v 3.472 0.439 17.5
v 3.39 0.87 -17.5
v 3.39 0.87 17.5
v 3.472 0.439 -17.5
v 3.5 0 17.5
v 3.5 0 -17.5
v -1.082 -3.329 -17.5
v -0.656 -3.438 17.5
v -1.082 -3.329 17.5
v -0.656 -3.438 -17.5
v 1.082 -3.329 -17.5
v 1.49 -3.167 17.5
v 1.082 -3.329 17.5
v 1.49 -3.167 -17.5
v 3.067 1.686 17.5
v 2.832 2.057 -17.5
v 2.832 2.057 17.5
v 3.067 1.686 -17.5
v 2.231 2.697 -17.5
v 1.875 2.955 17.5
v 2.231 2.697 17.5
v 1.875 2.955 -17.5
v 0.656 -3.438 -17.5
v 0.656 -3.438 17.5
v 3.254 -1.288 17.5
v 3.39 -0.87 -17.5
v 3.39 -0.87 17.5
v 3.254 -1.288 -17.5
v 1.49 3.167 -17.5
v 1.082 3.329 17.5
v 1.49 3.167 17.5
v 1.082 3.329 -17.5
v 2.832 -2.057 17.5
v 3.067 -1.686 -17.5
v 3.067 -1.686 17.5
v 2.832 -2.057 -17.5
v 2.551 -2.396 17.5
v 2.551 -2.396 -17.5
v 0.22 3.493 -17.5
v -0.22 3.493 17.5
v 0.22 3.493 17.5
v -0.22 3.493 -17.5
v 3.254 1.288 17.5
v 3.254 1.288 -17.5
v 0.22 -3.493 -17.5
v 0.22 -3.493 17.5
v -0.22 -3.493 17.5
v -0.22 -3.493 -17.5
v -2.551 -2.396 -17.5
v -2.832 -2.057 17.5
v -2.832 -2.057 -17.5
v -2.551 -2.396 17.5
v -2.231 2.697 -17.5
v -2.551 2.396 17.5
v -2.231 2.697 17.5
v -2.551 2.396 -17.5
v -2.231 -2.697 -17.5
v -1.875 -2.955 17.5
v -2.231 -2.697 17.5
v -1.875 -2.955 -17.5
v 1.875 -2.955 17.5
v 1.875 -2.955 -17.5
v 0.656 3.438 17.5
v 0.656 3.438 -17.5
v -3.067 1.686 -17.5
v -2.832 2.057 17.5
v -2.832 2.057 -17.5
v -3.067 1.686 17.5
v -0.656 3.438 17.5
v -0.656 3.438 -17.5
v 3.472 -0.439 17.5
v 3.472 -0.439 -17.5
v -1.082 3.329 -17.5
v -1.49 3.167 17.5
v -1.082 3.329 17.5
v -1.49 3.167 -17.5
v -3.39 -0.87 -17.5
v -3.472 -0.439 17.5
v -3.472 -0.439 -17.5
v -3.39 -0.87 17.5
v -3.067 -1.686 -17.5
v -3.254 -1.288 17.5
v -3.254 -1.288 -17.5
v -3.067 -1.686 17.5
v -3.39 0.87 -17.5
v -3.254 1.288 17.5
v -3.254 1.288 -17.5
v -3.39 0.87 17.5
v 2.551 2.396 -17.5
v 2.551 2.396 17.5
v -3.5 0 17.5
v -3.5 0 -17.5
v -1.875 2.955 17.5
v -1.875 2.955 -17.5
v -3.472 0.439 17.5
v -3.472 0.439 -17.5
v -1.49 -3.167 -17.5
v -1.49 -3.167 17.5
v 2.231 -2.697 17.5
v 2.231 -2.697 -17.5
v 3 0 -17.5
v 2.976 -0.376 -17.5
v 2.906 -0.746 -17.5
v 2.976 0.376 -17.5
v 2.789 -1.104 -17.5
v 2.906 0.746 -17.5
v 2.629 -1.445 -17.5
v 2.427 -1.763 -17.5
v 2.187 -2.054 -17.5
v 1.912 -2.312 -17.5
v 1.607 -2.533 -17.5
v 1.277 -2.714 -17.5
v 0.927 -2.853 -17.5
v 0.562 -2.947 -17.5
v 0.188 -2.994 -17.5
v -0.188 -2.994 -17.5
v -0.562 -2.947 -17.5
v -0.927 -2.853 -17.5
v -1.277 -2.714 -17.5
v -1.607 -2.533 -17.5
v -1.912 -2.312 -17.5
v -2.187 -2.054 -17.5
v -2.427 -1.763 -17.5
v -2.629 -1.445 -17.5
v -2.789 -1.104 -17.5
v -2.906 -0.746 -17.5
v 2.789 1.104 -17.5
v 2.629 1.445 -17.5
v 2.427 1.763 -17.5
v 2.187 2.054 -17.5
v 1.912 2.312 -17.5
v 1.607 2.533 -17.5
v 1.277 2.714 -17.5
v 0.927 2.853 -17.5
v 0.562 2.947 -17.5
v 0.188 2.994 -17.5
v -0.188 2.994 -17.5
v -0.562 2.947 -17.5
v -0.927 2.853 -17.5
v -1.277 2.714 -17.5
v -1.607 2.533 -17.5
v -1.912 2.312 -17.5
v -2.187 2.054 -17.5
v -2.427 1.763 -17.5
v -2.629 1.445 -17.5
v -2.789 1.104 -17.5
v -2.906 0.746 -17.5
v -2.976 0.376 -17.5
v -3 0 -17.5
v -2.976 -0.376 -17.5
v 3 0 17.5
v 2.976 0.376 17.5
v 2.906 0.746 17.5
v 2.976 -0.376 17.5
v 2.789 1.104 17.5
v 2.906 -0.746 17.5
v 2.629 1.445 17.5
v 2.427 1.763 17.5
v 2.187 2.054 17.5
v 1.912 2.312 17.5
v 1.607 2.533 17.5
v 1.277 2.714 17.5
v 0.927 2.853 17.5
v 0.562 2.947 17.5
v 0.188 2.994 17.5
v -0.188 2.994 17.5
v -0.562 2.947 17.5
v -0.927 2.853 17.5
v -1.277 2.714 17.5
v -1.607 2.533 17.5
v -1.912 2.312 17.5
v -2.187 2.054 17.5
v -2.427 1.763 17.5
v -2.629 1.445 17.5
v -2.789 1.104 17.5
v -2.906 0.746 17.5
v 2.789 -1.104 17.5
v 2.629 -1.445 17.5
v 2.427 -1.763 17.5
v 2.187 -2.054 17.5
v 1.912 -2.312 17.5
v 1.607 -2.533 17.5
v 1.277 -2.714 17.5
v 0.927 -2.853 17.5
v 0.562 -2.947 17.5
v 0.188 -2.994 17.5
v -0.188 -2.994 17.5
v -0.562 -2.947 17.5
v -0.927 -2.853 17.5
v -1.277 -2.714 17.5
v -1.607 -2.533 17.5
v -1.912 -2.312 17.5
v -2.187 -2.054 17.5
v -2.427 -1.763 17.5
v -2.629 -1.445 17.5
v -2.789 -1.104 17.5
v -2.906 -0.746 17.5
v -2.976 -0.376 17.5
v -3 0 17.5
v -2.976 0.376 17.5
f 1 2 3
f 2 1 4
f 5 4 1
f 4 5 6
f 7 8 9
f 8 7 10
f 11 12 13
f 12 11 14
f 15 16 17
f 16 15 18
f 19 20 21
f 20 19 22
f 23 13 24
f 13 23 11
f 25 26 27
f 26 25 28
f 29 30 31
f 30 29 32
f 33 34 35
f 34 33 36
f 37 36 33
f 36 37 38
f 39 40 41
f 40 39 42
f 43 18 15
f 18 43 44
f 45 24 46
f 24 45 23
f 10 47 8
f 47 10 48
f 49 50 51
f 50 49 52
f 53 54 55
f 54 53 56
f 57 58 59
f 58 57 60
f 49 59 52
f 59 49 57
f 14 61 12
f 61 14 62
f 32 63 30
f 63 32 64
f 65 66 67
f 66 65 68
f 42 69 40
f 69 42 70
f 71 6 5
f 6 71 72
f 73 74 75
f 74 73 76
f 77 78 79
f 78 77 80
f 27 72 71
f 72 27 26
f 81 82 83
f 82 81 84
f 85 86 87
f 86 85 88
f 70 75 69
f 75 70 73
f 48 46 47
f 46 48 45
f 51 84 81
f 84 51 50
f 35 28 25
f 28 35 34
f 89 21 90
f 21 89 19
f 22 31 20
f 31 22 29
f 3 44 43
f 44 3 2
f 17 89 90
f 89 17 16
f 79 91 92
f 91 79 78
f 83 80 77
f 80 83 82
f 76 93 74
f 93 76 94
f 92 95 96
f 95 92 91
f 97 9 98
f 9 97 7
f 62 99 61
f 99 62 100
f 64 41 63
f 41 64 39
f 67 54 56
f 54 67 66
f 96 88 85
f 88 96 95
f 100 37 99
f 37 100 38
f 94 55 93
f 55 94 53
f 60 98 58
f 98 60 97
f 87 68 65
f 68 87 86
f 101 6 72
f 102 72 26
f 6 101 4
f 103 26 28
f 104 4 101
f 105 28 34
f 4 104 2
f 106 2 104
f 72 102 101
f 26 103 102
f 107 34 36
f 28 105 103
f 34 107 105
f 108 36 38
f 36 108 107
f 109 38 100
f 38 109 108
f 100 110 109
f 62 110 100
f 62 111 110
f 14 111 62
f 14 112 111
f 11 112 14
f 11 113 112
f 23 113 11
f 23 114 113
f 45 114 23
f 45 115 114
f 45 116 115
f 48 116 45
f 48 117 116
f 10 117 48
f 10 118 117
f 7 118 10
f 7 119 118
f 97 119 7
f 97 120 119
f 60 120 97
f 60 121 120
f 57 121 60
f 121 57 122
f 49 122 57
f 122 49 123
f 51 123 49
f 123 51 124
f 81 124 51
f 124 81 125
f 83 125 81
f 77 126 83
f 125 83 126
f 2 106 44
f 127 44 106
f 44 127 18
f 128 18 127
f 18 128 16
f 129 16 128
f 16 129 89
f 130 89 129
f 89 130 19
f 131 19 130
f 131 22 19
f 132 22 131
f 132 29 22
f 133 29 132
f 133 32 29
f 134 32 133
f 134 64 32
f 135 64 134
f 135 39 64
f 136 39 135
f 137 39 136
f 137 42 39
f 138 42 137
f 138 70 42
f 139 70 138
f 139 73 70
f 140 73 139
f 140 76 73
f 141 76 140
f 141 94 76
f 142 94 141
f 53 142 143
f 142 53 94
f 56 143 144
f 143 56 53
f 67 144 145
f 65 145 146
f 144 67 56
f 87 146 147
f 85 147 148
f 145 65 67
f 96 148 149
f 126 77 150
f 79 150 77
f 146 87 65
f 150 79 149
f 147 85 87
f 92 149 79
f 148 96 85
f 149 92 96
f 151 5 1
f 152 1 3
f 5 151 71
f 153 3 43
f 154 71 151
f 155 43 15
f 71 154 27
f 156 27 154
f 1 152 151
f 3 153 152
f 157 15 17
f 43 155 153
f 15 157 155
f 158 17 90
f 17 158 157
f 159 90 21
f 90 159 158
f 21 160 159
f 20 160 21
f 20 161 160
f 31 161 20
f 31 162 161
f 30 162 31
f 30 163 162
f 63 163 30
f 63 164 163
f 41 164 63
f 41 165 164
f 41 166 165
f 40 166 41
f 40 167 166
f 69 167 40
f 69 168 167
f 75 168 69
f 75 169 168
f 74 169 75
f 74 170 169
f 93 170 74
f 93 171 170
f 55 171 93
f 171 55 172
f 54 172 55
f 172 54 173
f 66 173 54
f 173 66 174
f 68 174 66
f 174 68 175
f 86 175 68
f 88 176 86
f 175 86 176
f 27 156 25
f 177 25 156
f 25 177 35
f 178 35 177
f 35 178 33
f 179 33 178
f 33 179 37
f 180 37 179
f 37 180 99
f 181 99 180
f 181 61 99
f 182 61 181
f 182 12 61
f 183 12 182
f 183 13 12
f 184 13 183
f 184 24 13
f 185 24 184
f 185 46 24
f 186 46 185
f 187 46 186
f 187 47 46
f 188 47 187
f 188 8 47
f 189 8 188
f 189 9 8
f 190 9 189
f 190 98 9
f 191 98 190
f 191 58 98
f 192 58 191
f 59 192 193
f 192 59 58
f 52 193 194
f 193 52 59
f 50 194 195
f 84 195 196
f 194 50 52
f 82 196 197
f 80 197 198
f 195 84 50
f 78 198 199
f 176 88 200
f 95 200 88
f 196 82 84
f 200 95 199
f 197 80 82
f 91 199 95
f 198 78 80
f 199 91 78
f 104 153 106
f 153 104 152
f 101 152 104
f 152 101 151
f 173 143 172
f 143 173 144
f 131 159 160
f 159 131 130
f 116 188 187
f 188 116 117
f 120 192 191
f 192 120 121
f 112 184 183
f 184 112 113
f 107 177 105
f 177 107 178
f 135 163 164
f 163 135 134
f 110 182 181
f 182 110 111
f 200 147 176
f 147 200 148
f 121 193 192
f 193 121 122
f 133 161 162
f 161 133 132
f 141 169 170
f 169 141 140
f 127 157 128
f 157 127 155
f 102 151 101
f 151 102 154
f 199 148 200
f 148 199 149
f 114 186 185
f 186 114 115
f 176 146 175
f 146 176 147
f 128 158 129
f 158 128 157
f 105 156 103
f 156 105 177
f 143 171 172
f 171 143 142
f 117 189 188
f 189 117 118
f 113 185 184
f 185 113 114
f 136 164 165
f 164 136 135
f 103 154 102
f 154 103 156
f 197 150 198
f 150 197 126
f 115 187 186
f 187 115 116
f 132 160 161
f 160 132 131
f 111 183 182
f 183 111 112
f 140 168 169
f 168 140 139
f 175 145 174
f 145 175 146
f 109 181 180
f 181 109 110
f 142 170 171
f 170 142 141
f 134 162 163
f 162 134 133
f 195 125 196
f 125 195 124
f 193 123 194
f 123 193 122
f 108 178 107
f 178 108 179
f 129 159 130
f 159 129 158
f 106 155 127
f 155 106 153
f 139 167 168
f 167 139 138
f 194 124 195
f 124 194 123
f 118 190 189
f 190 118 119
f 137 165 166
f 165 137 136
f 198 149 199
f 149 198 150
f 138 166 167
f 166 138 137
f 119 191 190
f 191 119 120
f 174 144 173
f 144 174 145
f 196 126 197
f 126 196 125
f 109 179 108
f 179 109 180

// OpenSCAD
$fn = 50;


difference() {
	union() {
		translate(v = [0, 0, -17.5000000000]) {
			cylinder(h = 35, r = 3.5000000000);
		}
	}
	union() {
		translate(v = [0, 0, -100.0000000000]) {
			cylinder(h = 200, r = 3.0000000000);
		}
	}
}
